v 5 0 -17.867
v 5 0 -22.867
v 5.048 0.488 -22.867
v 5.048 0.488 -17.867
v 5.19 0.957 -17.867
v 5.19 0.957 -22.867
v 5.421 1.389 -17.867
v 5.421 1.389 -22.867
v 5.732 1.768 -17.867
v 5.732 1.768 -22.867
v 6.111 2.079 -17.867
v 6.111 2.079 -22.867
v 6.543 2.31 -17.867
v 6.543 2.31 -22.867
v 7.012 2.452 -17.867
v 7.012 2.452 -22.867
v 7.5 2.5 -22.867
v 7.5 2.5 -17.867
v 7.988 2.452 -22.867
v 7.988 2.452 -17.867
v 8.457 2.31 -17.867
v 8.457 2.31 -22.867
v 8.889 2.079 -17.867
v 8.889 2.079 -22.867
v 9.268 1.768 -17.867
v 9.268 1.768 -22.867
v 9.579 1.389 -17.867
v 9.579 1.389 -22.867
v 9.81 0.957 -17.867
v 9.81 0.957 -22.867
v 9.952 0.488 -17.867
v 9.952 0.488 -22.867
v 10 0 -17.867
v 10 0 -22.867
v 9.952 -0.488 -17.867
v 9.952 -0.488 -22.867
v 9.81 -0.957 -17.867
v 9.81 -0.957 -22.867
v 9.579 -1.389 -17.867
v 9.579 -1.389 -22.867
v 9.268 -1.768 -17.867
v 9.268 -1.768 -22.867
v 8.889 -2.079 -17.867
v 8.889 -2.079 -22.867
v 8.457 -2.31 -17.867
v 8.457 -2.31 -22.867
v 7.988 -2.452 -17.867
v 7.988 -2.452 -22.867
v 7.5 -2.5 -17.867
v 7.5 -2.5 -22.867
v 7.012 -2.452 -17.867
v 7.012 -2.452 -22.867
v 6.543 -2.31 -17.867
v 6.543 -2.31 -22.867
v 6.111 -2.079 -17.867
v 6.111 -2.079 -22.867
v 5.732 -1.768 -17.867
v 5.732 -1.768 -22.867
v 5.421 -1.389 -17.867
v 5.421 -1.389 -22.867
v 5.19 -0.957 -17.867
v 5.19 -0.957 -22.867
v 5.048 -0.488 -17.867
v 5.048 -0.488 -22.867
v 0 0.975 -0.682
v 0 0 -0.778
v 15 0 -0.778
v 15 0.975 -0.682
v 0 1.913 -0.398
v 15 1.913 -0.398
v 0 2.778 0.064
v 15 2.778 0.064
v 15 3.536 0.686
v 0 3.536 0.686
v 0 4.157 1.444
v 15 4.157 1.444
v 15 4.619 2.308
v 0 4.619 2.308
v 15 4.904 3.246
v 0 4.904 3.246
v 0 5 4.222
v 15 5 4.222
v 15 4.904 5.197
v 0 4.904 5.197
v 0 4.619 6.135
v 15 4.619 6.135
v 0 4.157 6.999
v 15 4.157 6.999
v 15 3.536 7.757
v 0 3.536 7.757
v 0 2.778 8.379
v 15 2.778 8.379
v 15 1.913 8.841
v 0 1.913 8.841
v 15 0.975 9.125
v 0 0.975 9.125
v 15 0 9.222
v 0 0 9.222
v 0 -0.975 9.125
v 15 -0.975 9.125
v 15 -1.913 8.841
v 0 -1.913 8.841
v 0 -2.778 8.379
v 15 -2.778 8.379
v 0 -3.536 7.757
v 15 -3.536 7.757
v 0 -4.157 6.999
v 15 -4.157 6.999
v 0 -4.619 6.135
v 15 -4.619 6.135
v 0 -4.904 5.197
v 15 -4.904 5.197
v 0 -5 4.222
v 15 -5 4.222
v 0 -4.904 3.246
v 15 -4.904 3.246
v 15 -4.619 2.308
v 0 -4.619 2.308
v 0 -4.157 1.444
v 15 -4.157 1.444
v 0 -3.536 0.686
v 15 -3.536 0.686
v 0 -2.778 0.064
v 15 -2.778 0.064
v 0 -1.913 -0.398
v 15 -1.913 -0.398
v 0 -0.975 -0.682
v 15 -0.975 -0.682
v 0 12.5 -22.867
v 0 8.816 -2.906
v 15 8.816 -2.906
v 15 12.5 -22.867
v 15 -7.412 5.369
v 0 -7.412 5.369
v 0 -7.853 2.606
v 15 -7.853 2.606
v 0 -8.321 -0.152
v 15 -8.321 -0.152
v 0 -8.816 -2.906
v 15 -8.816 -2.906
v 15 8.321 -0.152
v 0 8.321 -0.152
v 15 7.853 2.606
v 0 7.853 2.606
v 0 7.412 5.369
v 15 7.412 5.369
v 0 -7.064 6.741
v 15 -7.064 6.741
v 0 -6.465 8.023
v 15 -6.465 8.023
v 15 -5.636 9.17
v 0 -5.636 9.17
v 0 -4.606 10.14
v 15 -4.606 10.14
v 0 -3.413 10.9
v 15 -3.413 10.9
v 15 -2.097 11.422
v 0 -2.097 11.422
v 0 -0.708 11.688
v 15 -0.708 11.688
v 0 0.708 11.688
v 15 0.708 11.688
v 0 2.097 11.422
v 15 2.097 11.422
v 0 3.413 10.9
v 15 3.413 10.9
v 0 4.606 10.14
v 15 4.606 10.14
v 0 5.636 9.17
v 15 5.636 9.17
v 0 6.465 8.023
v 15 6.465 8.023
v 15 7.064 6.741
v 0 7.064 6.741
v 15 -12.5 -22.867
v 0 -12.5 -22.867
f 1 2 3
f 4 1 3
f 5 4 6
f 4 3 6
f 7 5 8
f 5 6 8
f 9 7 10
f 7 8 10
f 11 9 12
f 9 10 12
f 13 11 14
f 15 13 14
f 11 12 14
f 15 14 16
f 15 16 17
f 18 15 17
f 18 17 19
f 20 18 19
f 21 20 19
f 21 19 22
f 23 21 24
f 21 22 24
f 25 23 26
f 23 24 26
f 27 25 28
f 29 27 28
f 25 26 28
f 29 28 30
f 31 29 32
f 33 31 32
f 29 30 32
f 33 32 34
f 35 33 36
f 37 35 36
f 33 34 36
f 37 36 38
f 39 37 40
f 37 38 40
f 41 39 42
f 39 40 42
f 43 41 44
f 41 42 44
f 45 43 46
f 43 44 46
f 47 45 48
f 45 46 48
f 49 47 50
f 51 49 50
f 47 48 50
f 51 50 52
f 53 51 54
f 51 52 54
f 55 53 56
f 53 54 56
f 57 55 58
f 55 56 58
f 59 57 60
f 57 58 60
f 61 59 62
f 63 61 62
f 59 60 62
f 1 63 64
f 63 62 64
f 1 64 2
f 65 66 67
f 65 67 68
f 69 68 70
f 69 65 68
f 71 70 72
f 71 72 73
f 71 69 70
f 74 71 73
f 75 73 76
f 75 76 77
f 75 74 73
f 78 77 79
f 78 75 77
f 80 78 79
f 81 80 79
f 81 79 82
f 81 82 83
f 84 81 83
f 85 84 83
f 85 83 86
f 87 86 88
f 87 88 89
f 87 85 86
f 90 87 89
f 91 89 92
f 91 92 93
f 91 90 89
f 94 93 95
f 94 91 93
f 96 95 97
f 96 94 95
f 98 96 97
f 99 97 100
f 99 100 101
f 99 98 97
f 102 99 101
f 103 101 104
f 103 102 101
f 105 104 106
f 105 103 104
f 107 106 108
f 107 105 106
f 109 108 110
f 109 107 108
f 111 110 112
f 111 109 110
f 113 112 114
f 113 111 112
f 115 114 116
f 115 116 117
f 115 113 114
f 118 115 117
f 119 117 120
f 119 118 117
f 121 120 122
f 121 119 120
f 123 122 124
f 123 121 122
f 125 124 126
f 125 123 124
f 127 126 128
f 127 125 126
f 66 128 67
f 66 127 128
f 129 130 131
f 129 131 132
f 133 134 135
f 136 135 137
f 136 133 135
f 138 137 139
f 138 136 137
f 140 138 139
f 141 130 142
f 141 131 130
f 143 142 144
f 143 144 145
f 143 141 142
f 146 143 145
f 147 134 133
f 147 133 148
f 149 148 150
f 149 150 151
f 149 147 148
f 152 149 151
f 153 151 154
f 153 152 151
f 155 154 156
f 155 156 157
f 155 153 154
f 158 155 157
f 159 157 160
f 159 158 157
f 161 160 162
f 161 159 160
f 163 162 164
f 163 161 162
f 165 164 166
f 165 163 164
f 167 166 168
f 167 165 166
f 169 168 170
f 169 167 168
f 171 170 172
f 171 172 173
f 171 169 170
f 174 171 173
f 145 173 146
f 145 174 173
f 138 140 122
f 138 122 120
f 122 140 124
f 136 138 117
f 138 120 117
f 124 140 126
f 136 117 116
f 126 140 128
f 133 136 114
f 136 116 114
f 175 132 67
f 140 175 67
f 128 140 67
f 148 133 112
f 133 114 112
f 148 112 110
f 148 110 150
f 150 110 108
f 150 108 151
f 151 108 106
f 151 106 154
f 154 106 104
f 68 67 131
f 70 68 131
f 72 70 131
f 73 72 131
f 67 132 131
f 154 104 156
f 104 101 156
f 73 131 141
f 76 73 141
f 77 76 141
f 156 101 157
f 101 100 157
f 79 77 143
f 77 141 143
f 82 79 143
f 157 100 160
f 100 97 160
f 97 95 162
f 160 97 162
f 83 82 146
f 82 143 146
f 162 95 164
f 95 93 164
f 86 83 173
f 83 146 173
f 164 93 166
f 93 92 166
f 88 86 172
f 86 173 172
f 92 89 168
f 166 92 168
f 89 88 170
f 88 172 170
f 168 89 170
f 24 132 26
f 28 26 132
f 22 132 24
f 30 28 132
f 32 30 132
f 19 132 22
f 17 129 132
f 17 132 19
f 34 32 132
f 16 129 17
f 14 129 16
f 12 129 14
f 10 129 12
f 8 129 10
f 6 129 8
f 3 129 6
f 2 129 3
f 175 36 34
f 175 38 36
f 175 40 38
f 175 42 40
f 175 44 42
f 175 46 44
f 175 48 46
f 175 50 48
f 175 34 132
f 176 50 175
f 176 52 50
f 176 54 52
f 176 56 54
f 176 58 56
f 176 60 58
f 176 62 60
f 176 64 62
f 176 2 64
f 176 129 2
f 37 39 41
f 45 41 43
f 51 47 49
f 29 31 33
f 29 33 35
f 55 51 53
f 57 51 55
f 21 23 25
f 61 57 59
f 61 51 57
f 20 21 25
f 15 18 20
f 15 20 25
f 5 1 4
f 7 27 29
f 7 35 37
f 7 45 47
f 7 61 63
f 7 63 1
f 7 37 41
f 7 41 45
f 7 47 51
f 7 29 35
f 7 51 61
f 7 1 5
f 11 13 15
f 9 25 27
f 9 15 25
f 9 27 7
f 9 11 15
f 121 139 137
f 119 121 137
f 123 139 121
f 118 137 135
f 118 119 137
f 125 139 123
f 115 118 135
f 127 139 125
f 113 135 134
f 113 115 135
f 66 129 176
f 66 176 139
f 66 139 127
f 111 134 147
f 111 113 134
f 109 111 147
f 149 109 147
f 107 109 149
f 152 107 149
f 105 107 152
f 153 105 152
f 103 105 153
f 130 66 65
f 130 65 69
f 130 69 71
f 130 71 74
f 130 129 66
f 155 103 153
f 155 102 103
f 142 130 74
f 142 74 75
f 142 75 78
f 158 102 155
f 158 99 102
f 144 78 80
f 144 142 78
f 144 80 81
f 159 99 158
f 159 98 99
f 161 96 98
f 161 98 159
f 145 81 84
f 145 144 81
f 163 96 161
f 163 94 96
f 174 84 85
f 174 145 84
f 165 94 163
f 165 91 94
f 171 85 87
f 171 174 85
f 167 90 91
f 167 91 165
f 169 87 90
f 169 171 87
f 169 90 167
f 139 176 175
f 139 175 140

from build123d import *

# Parameters (mm, degrees)
SKETCH1_R           = 5
BOSS_EXTRUDE1_DEPTH = 15
FILLET1_R           = 290
SKETCH3_R           = 2.5
CUT_EXTRUDE2_DEPTH  = 5


with BuildPart() as part:
    # Sketch1 → Boss-Extrude1 (new body)
    with BuildSketch(Plane(origin=(0, 0, 0), x_dir=(0, 0, -1), z_dir=(1, 0, 0))):
        with BuildLine():
            Line((-4.221556886, 7.5), (22.866991249, 12.5))
            Line((22.866991249, 12.5), (22.866991249, -12.5))
            Line((22.866991249, -12.5), (-4.221556886, -7.5))
            ThreePointArc((-4.221556886, -7.5), (-11.721556886, 0), (-4.221556886, 7.5))
        make_face()
        with Locations((-4.221556886, 0)):
            Circle(SKETCH1_R, mode=Mode.SUBTRACT)
    extrude(amount=BOSS_EXTRUDE1_DEPTH)

    # Fillet1
    fillet1_edges = [part.edges().sort_by_distance(p)[0] for p in [
        (7.5, -7.5, 4.221556886),
        (7.5, 7.5, 4.221556886),
    ]]
    fillet(fillet1_edges, radius=FILLET1_R)

    # Sketch3 → Cut-Extrude2 (cut)
    with BuildSketch(Plane(origin=(0, 0, -22.866991249), x_dir=(-1, 0, 0), z_dir=(0, 0, -1))):
        with Locations((-7.5, 0)):
            Circle(SKETCH3_R)
    extrude(amount=-CUT_EXTRUDE2_DEPTH, mode=Mode.SUBTRACT)


solid = part.part
